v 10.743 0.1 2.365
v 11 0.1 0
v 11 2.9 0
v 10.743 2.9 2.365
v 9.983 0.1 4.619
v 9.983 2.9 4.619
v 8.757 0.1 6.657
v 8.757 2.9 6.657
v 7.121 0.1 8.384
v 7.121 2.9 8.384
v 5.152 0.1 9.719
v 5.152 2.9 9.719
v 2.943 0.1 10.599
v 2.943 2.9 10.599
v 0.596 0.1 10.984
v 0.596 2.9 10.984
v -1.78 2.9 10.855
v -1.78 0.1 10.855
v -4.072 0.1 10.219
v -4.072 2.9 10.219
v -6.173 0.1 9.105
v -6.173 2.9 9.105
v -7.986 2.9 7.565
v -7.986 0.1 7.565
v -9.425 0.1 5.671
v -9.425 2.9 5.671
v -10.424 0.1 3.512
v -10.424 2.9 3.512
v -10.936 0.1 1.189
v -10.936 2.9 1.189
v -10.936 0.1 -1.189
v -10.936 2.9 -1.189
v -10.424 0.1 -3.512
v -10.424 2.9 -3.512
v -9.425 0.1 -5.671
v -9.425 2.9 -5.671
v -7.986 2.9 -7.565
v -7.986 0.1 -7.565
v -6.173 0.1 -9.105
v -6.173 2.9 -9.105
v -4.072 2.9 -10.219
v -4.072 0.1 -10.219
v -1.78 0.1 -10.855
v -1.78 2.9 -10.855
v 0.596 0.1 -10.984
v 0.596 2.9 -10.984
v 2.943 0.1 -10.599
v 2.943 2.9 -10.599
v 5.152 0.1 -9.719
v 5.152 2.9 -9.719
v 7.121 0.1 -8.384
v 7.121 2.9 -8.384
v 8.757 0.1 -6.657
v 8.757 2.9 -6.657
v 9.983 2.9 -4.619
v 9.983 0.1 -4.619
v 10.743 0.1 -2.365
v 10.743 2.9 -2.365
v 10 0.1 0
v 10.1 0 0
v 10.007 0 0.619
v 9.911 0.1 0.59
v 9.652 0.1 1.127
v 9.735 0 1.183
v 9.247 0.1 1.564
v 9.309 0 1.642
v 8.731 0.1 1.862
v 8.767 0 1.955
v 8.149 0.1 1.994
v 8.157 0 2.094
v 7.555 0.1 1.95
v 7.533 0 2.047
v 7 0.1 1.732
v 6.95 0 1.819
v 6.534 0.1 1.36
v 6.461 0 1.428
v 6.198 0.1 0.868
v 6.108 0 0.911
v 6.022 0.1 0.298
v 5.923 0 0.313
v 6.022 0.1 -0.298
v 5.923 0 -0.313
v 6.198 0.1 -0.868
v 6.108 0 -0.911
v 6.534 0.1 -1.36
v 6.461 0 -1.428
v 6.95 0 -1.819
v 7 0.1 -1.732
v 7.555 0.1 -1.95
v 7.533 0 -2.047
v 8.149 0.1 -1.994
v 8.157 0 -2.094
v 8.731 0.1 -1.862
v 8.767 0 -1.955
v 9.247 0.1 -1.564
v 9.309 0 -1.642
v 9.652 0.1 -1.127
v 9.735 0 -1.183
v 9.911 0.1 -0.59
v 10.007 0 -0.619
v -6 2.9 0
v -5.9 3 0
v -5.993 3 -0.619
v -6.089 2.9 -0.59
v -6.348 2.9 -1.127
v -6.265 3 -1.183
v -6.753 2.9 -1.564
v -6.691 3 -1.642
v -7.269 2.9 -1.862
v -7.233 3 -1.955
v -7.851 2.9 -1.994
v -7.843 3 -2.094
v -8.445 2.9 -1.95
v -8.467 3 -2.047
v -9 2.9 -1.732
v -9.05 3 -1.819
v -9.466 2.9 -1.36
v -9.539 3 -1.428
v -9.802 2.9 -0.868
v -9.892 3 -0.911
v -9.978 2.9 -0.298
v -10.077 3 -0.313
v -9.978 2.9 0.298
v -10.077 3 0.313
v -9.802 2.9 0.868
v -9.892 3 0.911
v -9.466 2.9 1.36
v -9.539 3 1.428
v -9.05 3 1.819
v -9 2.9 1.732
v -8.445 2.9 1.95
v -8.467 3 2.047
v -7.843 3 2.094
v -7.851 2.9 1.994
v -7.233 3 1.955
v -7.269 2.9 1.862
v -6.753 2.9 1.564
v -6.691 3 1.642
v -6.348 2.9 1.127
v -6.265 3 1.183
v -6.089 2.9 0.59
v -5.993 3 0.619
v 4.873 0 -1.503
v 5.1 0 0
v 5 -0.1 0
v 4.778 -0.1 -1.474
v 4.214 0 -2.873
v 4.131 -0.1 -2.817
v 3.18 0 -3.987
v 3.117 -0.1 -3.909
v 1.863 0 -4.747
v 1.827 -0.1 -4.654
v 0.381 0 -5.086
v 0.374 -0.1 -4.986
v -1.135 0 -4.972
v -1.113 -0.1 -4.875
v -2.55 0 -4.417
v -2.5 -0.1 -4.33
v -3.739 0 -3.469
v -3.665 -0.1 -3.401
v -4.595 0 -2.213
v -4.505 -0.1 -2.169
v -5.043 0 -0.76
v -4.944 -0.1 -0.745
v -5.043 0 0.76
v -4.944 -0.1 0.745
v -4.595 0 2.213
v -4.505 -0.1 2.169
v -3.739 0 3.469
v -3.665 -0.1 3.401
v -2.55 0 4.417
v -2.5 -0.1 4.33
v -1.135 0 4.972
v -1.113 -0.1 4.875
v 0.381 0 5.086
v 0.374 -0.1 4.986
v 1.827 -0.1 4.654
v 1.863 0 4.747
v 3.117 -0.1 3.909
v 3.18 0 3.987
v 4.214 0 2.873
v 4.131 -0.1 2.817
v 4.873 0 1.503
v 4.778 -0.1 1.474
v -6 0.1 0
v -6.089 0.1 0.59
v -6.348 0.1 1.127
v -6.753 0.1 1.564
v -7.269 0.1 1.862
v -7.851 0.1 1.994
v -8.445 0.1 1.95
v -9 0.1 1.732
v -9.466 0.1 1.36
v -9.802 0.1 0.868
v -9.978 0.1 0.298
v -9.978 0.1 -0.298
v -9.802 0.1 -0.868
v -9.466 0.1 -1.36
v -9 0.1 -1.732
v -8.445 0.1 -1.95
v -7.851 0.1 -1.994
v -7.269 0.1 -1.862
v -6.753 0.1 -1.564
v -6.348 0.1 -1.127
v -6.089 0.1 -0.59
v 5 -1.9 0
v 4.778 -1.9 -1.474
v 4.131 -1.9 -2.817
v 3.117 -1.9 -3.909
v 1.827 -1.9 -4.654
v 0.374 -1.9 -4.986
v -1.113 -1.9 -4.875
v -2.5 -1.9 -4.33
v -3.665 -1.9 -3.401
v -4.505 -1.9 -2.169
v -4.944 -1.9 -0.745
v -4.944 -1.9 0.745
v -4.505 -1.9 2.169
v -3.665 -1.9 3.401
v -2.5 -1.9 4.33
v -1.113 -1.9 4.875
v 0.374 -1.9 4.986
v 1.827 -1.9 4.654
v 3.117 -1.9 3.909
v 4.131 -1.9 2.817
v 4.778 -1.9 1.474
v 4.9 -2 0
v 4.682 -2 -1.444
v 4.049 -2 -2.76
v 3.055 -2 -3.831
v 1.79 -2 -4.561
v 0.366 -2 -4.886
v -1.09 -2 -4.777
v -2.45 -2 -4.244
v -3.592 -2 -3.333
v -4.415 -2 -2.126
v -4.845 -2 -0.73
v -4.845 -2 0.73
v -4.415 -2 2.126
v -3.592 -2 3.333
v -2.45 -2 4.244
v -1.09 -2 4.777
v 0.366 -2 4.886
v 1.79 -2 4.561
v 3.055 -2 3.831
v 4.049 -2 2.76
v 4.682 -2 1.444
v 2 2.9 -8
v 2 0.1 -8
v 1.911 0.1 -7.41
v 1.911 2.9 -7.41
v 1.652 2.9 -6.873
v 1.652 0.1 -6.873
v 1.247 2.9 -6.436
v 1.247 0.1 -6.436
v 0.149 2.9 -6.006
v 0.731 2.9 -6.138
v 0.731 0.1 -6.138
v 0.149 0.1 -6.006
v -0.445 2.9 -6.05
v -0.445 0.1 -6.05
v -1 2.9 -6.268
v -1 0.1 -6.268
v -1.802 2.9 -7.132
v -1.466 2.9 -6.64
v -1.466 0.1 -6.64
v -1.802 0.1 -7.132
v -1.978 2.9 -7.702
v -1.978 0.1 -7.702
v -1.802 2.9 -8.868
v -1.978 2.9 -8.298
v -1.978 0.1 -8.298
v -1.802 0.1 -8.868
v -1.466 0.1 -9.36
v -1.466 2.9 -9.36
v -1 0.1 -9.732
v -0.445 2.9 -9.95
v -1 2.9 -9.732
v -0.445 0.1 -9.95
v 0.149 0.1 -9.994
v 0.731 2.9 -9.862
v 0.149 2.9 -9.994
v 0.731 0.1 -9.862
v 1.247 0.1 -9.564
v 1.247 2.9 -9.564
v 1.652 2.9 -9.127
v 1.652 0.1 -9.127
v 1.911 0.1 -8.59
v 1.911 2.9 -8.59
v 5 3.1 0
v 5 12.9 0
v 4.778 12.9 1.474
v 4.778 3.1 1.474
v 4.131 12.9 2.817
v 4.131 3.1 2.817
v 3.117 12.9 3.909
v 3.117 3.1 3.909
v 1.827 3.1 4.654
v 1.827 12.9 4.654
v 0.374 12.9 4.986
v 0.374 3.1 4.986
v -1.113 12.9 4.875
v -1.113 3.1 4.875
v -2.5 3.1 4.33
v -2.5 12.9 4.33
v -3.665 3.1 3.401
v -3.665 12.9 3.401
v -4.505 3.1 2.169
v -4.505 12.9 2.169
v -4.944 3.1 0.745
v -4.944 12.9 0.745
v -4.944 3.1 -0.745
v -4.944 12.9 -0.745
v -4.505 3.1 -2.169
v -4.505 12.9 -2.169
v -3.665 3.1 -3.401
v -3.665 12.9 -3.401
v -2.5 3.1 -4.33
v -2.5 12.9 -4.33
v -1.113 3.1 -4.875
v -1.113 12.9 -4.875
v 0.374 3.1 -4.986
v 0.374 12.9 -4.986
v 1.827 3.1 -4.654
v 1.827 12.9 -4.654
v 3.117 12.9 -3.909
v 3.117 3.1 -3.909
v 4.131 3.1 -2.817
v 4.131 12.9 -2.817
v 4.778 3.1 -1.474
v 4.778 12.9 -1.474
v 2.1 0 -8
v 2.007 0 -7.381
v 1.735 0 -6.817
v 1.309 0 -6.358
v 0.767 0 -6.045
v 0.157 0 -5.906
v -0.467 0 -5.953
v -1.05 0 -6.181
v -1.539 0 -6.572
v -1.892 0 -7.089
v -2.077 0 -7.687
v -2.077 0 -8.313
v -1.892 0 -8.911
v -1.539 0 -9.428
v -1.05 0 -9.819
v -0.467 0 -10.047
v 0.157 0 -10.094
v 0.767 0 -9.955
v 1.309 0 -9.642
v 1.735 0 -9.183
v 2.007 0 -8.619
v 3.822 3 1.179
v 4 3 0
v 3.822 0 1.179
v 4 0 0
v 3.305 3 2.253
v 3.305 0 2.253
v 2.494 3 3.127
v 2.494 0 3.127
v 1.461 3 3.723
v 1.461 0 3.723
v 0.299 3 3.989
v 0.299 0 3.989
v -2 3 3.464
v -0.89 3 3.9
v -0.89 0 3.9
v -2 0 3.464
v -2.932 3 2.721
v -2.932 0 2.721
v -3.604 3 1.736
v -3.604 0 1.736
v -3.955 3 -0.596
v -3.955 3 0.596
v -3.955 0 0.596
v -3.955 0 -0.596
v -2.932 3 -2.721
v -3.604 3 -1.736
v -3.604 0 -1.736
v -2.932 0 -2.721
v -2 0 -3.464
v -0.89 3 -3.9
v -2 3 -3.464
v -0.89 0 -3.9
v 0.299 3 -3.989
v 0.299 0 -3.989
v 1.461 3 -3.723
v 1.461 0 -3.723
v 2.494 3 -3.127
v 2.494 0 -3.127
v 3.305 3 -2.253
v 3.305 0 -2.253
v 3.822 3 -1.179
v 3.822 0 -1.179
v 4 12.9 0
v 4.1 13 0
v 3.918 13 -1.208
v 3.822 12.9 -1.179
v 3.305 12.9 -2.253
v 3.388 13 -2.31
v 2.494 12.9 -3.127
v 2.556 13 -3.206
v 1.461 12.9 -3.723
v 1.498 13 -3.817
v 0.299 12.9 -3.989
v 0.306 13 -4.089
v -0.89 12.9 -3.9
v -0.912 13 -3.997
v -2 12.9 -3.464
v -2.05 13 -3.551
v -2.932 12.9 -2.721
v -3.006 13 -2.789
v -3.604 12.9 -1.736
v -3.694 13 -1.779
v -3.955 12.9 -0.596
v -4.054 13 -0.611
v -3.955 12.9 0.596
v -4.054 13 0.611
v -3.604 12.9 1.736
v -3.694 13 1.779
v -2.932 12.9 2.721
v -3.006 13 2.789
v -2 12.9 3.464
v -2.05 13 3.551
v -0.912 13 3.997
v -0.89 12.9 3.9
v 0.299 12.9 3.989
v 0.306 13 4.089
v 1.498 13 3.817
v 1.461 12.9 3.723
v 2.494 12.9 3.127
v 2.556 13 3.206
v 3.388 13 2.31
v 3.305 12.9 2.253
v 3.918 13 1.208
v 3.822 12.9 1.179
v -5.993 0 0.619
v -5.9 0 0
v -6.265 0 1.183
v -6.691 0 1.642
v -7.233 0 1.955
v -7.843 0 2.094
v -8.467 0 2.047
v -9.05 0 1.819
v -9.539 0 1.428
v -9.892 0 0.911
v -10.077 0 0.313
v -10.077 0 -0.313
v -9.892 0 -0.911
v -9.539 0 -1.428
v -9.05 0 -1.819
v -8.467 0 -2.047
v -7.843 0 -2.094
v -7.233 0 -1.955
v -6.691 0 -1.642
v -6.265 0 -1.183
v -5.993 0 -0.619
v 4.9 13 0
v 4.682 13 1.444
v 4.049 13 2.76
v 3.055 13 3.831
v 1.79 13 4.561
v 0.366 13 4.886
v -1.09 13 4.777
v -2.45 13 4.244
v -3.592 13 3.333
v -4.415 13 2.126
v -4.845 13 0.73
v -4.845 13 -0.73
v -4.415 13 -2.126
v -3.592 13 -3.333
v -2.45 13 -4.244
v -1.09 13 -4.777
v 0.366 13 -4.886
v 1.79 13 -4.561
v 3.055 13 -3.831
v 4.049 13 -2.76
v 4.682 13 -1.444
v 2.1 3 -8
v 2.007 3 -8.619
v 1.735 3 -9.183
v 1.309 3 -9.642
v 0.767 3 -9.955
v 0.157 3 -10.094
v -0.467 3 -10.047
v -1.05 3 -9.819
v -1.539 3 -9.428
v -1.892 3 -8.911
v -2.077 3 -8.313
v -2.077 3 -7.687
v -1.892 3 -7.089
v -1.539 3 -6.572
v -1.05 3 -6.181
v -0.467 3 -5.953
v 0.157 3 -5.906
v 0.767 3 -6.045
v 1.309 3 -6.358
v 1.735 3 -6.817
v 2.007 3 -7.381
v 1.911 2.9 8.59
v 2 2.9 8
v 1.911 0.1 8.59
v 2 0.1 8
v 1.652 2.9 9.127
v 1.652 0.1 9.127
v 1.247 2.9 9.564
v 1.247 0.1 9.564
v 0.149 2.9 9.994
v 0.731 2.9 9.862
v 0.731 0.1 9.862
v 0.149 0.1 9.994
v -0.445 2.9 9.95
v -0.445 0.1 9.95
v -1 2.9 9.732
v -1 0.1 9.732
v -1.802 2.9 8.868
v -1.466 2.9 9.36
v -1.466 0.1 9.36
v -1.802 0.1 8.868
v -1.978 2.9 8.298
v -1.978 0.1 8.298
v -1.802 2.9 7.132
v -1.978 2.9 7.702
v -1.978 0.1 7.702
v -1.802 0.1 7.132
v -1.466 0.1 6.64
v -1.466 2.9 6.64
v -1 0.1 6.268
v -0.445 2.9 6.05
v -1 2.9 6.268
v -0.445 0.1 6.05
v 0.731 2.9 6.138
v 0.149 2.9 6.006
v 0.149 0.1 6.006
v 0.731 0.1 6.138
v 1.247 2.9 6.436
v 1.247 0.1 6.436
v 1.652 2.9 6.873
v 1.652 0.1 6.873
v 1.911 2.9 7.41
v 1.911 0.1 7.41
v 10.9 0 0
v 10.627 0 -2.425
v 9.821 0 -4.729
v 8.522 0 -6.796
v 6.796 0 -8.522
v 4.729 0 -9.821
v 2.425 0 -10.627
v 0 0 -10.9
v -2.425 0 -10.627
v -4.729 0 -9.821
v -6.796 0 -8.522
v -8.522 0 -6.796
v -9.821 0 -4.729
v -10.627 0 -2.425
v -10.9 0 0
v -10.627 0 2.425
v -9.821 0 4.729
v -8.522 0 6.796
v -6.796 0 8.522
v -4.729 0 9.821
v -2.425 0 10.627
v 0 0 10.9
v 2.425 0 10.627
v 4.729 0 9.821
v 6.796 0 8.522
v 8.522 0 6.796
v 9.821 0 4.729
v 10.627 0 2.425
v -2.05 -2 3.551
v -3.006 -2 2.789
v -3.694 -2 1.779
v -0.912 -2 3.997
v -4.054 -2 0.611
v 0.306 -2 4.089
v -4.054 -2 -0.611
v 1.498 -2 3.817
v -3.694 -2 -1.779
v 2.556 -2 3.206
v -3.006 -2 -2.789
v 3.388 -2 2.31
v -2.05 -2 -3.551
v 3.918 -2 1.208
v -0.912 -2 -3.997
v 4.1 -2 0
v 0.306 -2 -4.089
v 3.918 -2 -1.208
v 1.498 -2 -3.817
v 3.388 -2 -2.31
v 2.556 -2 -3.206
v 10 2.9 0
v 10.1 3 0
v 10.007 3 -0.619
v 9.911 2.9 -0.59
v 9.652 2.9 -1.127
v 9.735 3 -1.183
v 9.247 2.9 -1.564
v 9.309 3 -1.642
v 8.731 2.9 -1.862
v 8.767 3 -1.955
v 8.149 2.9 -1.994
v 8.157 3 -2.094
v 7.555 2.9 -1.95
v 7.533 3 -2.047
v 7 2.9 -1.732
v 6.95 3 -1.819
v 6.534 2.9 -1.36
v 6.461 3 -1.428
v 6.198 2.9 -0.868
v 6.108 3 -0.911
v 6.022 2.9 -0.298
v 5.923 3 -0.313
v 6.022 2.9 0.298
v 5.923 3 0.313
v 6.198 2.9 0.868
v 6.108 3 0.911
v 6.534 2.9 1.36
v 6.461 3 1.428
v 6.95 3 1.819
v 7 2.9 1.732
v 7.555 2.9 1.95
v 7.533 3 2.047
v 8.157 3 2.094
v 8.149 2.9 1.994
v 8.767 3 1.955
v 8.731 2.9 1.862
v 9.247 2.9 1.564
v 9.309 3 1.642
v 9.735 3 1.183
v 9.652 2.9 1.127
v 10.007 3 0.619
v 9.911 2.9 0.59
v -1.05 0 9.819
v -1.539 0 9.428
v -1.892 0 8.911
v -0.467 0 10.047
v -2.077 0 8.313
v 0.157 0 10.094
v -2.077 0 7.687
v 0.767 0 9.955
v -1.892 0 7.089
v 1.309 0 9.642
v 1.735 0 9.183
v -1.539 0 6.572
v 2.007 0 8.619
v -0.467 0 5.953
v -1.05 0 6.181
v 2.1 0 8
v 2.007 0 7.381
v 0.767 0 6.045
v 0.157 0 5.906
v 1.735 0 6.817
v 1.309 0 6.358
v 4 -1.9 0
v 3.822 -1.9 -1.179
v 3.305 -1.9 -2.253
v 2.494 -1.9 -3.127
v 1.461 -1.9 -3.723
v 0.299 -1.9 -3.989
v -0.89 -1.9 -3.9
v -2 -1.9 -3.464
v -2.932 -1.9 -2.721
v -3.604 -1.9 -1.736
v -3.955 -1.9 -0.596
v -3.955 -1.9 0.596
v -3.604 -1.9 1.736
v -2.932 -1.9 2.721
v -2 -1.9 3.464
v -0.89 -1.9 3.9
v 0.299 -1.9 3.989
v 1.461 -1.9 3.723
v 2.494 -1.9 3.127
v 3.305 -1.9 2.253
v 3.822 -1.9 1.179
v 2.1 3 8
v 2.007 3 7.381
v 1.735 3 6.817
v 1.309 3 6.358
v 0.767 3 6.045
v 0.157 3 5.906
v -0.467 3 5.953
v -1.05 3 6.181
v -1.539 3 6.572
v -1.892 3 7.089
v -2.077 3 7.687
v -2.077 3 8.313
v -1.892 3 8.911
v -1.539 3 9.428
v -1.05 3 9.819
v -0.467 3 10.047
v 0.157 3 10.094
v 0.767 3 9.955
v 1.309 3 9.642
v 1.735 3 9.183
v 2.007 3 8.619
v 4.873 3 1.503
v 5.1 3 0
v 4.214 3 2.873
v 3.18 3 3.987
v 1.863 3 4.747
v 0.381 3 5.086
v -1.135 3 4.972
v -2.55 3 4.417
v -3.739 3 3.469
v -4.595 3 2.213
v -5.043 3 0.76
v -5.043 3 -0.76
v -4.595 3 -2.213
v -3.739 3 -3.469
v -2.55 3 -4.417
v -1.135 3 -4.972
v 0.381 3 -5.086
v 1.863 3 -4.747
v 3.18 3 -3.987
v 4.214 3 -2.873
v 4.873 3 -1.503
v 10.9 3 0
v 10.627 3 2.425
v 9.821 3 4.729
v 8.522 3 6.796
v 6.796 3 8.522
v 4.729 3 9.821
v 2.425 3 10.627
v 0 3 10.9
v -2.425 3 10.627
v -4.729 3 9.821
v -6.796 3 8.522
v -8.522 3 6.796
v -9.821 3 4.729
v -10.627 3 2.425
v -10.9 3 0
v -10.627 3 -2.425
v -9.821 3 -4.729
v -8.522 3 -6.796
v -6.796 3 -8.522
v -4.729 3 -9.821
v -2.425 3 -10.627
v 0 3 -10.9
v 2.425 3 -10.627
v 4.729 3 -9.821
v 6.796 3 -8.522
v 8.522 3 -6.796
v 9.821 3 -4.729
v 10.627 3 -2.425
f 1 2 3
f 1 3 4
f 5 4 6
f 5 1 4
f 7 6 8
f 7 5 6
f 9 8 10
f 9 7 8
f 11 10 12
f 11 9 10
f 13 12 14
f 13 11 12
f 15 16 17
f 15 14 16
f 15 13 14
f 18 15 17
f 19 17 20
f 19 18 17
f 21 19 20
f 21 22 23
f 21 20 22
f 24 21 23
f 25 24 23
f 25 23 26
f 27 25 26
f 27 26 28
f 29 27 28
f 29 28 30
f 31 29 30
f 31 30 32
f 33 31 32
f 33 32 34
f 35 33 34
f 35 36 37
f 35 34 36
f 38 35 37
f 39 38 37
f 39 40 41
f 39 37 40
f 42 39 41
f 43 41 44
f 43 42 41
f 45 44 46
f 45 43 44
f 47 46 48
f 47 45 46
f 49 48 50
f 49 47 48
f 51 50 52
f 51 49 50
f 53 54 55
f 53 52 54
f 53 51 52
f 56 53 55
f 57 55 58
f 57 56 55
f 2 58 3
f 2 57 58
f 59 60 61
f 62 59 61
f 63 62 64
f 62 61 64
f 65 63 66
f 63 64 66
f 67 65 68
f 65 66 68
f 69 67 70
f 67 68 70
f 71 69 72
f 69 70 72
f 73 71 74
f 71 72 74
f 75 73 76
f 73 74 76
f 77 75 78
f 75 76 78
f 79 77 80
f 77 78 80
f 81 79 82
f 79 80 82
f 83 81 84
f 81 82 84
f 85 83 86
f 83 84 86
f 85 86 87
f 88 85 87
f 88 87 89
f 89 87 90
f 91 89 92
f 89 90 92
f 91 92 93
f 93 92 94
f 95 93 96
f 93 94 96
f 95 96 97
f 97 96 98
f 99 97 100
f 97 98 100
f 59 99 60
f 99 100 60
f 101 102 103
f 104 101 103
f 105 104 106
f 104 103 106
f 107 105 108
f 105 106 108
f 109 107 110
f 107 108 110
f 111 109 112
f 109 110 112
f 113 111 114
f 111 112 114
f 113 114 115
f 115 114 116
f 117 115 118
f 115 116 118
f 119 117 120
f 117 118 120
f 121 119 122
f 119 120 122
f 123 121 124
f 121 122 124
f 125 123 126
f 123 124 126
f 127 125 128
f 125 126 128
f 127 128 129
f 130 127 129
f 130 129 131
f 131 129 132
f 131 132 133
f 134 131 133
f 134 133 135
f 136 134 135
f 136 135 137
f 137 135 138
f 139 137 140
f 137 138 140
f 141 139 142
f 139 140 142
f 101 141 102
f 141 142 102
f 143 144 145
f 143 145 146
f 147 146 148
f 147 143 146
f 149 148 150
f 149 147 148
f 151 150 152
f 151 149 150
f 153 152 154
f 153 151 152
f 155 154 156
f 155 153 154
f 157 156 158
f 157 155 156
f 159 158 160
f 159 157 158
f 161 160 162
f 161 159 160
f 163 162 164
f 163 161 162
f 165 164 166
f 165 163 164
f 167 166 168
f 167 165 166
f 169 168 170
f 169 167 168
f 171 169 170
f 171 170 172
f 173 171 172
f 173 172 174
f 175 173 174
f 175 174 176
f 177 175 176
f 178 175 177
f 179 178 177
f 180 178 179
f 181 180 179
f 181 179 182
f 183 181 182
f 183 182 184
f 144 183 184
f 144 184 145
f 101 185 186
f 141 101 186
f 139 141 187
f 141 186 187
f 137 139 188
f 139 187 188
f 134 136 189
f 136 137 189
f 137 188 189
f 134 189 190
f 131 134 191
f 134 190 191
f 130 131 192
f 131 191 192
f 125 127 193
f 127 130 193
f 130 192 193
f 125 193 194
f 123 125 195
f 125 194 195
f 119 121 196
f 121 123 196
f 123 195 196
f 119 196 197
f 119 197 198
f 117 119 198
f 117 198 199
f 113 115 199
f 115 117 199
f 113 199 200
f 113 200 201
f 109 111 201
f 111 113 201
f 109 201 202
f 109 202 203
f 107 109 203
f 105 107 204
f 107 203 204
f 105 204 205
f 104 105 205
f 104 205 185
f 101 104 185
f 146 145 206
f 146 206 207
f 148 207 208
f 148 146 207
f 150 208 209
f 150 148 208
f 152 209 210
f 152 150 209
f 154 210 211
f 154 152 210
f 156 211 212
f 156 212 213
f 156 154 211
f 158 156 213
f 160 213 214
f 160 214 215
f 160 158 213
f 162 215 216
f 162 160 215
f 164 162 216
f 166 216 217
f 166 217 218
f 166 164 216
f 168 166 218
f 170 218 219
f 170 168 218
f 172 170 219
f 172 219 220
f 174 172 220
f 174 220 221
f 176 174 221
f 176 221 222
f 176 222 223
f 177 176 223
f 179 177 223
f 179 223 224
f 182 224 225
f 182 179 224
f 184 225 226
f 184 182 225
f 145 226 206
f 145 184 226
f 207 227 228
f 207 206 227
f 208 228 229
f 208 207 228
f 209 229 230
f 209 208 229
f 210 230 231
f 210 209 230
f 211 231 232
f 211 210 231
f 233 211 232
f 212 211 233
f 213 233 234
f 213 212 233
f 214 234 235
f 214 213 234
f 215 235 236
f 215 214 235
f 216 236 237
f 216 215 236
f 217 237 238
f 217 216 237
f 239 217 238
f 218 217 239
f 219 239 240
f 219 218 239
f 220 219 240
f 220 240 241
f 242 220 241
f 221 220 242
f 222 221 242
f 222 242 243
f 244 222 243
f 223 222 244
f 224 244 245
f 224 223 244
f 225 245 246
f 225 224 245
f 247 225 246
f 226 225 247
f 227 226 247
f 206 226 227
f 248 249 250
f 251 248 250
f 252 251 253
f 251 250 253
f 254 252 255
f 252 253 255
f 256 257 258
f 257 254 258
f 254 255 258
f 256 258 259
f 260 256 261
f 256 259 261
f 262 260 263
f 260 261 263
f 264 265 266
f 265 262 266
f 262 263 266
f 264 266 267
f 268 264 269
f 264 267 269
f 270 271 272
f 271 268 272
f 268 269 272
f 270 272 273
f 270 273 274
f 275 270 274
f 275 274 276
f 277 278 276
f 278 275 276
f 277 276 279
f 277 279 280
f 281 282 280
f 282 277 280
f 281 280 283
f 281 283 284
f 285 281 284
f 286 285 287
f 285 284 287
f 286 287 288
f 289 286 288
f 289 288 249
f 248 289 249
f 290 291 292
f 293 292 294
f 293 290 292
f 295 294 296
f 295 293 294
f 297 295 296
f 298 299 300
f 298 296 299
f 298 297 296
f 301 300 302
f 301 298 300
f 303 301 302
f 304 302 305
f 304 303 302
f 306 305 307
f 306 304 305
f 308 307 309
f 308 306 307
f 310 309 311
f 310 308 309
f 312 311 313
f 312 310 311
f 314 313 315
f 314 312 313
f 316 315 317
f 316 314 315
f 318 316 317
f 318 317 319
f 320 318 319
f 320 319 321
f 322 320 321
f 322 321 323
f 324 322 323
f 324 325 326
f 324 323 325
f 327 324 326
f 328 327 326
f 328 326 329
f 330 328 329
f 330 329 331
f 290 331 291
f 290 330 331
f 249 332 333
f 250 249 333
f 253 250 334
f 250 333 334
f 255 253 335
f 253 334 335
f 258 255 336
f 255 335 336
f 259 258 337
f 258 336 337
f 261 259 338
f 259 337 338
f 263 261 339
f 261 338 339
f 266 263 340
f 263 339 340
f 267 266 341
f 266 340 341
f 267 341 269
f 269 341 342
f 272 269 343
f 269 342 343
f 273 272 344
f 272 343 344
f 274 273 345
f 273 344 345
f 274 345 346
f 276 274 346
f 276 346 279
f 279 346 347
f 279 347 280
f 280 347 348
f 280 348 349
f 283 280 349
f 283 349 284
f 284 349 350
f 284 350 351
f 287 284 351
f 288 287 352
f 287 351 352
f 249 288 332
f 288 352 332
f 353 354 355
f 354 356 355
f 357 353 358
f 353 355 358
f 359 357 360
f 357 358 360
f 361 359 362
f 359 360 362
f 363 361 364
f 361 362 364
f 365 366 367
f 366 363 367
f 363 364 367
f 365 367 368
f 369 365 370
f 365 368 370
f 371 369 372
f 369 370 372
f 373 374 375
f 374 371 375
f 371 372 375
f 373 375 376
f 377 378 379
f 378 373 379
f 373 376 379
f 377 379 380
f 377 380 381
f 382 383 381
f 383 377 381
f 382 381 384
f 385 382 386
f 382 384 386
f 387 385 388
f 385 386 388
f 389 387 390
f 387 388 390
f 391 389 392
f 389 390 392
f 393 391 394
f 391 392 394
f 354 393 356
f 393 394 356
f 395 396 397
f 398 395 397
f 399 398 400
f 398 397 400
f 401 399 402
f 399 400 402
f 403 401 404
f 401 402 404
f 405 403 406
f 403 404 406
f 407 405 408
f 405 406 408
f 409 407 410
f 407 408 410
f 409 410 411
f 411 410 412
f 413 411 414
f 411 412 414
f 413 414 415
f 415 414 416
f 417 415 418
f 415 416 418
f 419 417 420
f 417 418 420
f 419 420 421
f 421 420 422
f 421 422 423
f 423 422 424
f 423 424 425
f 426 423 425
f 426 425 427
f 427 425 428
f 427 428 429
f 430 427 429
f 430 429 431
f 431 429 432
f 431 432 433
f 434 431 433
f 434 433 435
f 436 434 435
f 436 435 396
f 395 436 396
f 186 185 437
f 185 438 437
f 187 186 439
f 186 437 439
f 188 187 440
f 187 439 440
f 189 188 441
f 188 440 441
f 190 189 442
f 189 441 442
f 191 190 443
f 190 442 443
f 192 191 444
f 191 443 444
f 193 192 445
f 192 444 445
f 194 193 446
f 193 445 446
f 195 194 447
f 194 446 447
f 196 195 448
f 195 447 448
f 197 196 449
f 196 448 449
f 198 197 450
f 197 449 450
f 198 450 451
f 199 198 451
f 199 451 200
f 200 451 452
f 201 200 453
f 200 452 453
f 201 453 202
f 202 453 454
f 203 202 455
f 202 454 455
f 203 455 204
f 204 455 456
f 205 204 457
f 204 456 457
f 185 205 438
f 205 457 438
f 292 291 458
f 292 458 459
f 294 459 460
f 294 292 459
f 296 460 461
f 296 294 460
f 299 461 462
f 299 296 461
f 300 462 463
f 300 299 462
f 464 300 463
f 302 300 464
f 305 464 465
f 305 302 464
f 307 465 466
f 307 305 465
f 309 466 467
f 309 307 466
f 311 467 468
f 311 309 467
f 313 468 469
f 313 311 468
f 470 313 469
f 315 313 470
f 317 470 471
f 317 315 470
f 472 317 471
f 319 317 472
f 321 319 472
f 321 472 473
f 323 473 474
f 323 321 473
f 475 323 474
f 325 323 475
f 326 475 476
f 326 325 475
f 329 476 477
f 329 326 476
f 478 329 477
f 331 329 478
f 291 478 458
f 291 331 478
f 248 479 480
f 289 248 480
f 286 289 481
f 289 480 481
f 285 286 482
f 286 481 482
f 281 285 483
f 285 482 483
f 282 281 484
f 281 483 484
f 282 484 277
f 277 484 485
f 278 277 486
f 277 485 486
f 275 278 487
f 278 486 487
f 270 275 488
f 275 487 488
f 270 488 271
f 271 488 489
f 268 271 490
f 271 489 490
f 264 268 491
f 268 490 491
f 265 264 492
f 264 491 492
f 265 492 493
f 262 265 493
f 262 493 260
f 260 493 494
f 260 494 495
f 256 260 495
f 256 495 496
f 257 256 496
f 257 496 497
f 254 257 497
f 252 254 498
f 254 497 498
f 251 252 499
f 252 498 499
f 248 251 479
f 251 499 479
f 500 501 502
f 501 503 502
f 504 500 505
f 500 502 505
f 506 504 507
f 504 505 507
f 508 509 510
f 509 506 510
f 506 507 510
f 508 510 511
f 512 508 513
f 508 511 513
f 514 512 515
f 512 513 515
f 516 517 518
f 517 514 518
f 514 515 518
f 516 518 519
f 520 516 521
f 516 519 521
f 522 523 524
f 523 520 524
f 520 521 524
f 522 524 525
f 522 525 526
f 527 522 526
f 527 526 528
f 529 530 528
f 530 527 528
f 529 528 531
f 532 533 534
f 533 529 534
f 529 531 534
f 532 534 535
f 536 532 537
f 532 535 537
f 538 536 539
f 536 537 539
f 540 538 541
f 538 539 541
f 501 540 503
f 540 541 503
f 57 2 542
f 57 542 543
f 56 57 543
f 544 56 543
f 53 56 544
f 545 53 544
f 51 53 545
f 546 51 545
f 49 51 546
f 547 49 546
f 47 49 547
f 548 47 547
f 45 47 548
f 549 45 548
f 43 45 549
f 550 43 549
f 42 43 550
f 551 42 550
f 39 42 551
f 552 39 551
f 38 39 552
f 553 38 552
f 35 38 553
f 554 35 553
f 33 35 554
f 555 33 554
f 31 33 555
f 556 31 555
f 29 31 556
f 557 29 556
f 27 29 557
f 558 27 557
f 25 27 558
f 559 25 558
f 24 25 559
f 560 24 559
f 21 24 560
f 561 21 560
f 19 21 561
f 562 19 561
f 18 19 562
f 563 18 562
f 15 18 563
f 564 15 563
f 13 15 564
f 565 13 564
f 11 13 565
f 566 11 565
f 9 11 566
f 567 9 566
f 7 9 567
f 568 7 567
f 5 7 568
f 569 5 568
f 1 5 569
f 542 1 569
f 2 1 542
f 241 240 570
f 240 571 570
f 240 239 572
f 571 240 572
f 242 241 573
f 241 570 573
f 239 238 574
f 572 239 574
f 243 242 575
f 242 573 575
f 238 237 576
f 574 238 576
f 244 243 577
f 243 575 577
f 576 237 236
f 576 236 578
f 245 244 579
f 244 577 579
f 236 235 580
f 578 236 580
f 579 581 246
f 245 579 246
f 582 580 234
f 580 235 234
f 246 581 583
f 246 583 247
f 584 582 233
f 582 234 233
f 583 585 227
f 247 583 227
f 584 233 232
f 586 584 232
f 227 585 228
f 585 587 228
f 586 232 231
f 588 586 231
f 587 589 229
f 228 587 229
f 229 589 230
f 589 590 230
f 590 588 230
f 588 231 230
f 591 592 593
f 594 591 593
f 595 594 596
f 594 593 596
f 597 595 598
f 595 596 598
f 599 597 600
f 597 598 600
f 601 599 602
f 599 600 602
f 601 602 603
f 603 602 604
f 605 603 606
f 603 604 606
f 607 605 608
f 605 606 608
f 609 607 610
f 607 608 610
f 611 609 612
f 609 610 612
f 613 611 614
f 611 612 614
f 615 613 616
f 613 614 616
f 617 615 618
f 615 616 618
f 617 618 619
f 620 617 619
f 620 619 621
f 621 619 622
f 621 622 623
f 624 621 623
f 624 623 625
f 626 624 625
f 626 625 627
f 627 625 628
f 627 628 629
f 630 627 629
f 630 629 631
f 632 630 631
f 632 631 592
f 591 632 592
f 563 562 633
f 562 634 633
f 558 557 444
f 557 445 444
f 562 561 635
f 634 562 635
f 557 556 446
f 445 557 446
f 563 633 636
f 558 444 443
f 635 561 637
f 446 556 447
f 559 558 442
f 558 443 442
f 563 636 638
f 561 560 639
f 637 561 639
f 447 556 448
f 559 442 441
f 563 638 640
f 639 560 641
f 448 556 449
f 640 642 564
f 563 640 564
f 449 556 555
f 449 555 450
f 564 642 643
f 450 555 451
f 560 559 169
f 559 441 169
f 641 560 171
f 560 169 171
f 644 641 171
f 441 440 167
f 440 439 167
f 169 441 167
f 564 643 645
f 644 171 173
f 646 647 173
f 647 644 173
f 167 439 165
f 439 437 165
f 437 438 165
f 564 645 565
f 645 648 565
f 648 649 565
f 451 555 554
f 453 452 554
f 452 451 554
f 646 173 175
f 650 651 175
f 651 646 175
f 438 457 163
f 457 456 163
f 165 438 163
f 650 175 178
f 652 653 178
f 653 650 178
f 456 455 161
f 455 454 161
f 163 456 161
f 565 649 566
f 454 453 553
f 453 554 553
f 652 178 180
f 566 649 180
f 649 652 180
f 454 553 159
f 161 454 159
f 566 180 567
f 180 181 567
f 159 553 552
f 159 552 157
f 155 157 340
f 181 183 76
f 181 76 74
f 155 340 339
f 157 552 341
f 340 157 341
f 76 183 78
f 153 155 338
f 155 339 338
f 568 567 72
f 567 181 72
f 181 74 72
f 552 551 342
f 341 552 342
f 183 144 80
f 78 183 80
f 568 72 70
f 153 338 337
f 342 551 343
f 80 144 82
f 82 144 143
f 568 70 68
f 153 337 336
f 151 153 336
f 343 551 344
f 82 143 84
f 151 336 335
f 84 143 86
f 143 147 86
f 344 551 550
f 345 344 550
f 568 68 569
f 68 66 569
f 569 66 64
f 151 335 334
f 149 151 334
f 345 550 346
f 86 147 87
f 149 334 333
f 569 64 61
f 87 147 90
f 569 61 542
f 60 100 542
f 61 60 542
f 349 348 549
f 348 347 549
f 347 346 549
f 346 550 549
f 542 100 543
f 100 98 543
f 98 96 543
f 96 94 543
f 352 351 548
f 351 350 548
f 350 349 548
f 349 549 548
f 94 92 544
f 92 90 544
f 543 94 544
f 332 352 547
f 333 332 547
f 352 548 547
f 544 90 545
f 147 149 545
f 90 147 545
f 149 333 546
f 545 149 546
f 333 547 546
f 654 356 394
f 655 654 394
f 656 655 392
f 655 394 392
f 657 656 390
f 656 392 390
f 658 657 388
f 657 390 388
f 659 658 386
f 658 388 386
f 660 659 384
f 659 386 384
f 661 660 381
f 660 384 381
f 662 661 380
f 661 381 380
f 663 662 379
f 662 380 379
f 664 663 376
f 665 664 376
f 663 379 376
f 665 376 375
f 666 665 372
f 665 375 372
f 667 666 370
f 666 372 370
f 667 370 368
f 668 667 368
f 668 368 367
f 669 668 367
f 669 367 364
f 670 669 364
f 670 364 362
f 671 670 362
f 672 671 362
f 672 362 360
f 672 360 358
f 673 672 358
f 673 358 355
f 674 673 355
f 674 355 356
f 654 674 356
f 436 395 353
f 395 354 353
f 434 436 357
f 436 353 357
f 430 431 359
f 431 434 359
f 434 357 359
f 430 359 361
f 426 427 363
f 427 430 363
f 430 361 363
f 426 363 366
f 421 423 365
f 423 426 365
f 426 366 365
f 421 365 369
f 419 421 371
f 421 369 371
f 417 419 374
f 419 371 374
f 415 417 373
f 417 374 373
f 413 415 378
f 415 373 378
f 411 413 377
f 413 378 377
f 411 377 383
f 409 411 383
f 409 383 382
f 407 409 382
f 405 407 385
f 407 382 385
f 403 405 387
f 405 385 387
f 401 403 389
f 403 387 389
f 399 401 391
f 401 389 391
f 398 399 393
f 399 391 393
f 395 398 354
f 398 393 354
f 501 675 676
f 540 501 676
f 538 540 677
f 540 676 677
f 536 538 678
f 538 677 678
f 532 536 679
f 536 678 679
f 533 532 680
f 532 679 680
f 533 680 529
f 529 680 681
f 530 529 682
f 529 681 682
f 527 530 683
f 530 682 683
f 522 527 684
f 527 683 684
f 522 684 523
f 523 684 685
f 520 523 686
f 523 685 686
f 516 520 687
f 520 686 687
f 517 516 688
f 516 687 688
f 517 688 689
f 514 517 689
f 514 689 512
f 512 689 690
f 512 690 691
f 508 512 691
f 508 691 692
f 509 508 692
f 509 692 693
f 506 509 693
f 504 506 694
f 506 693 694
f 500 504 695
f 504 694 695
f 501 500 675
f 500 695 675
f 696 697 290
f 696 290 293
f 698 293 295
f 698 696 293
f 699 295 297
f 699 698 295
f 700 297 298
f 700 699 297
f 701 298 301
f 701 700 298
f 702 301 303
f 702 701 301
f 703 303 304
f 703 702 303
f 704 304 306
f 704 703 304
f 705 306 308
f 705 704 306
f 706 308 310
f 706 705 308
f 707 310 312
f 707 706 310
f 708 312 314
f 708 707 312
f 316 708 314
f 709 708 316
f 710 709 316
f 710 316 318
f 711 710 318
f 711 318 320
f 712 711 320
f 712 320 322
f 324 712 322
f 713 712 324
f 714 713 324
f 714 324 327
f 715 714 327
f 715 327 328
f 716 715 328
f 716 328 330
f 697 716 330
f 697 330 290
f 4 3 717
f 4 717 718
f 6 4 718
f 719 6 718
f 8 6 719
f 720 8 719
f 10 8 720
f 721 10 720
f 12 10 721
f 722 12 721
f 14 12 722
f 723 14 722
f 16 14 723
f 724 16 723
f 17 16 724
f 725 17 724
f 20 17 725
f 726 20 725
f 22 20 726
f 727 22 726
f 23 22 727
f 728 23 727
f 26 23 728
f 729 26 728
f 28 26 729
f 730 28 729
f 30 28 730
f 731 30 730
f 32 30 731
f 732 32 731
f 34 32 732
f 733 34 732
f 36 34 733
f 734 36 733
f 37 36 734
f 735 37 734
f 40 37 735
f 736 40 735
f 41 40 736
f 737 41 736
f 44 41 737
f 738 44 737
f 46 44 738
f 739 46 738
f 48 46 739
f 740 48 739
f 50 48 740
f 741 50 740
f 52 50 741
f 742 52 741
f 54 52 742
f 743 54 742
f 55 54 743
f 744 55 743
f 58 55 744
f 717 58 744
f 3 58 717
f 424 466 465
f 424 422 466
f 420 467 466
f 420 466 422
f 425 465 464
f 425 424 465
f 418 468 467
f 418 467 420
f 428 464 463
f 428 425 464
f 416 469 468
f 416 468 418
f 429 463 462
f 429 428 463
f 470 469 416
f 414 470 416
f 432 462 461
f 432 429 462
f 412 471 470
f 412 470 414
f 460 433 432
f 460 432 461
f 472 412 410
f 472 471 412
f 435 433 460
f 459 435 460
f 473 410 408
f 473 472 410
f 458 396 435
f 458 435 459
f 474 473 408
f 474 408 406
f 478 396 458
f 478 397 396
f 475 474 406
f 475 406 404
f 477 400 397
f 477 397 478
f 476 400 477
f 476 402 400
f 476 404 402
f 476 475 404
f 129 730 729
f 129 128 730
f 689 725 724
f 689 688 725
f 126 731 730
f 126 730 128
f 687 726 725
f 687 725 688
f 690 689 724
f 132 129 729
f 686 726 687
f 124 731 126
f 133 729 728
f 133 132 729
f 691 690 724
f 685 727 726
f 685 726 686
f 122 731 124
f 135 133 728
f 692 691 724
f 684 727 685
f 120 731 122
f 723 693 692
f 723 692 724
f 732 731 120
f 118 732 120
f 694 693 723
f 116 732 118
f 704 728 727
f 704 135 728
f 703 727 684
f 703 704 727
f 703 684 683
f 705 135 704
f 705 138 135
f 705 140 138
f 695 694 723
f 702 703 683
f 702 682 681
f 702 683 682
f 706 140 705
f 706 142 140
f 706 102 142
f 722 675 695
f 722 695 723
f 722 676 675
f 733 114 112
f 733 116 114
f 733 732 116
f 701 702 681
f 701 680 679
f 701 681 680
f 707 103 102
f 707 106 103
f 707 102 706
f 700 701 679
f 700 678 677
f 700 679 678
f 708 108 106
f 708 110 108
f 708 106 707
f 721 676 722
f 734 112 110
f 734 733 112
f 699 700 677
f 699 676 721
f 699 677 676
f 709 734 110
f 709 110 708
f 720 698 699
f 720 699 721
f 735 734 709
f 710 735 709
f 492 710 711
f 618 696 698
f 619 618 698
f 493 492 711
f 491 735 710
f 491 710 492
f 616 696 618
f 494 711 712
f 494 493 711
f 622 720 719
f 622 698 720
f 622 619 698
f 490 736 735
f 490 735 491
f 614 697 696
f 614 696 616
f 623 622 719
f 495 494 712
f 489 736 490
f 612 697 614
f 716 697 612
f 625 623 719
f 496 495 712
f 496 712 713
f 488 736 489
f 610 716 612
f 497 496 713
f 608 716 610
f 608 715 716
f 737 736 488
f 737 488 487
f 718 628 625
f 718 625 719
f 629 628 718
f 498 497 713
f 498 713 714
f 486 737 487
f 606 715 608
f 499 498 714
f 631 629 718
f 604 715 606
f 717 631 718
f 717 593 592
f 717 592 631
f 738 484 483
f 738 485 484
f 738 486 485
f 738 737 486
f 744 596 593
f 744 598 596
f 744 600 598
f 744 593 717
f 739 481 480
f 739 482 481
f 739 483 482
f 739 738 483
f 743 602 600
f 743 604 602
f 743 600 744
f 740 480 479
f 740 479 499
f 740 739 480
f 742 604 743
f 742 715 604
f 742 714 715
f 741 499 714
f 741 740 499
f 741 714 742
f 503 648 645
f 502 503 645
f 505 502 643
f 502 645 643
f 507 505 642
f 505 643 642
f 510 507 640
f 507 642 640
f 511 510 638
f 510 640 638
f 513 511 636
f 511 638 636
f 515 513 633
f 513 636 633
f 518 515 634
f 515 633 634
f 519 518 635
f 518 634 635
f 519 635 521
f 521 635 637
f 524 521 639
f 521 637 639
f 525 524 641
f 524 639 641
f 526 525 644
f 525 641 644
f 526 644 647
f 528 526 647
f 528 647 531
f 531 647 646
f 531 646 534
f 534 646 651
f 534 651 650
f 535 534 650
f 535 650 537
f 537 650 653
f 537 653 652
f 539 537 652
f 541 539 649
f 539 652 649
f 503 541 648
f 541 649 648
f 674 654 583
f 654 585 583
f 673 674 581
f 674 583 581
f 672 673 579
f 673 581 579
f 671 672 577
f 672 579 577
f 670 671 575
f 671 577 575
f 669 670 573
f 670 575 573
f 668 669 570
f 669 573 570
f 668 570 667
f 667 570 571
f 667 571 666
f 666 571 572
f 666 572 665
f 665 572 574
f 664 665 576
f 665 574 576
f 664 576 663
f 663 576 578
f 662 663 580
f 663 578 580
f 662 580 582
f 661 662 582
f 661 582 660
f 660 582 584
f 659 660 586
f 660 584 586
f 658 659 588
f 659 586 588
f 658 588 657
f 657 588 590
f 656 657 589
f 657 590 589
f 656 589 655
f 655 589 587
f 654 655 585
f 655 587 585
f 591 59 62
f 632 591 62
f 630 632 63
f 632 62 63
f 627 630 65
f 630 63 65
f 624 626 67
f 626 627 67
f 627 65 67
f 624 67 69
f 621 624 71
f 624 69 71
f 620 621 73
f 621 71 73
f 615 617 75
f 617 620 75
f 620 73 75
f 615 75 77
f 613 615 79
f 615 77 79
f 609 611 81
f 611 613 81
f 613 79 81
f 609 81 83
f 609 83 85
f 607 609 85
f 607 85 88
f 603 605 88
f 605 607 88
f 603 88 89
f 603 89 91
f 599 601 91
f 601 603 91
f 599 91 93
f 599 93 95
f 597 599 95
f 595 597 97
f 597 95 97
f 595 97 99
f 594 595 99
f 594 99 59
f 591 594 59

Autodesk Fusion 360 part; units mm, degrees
sketch "Sketch1" plane through (0, 0, 0) normal (0, 1, 0) x (1, 0, 0)
  circle A0 centre (0, 0) radius 5
  circle A1 centre (0, 0) radius 11
  circle A2 centre (0, 0) radius 4
  circle A3 centre (8, 0) radius 2
  circle A4 centre (0, 8) radius 2
  circle A5 centre (-8, 0) radius 2
  circle A6 centre (0, -8) radius 2
  dimension "d1" = 10
  dimension "d8" = 22
  dimension "d11" = 8
  dimension "d15" = 4
  dimension "d17" = 4
  dimension "d18" = 4
  dimension "d19" = 4
sketch "Sketch2" plane through (0, 0, 0) normal (0, 1, 0) x (1, 0, 0)
  line L0 (-25, 25) -> (25, 25)
  line L1 (25, 25) -> (25, -25)
  line L2 (25, -25) -> (-25, -25)
  line L3 (-25, -25) -> (-25, 25)
extrude "Extrude1" add sketch "Sketch1" along normal blind 3 contours A0 | A1 in component "Component"
extrude "Extrude2" add sketch "Sketch1" along normal blind 13 and the other way blind 2 contours A0 in component "Component"
chamfer "Chamfer1" distance 0.1 angle 45 16 edges at (-9.8647, 3, -0.7232) (-3.7293, 13, -1.4465) (-4.6616, 3, -1.8081) (6.1353, 3, -0.7232) (-1.8647, 3, -8.7232) (-1.8647, 3, 7.2768) (-4.6616, -2, -1.8081) (-10.2556, 0, 3.9778) (-4.6616, 13, 1.8081) (6.1353, 0, -0.7232) (-9.8647, 0, -0.7232) (-10.2556, 3, 3.9778) (-1.8647, 0, 7.2768) (-3.7293, -2, 1.4465) (-4.6616, 0, 1.8081) (-1.8647, 0, -8.7232) in component "Component"
component "Component" placed x (1, 0, 0) y (0, 1, 0) z (0, 0, 1) at (0, 0, 0)
